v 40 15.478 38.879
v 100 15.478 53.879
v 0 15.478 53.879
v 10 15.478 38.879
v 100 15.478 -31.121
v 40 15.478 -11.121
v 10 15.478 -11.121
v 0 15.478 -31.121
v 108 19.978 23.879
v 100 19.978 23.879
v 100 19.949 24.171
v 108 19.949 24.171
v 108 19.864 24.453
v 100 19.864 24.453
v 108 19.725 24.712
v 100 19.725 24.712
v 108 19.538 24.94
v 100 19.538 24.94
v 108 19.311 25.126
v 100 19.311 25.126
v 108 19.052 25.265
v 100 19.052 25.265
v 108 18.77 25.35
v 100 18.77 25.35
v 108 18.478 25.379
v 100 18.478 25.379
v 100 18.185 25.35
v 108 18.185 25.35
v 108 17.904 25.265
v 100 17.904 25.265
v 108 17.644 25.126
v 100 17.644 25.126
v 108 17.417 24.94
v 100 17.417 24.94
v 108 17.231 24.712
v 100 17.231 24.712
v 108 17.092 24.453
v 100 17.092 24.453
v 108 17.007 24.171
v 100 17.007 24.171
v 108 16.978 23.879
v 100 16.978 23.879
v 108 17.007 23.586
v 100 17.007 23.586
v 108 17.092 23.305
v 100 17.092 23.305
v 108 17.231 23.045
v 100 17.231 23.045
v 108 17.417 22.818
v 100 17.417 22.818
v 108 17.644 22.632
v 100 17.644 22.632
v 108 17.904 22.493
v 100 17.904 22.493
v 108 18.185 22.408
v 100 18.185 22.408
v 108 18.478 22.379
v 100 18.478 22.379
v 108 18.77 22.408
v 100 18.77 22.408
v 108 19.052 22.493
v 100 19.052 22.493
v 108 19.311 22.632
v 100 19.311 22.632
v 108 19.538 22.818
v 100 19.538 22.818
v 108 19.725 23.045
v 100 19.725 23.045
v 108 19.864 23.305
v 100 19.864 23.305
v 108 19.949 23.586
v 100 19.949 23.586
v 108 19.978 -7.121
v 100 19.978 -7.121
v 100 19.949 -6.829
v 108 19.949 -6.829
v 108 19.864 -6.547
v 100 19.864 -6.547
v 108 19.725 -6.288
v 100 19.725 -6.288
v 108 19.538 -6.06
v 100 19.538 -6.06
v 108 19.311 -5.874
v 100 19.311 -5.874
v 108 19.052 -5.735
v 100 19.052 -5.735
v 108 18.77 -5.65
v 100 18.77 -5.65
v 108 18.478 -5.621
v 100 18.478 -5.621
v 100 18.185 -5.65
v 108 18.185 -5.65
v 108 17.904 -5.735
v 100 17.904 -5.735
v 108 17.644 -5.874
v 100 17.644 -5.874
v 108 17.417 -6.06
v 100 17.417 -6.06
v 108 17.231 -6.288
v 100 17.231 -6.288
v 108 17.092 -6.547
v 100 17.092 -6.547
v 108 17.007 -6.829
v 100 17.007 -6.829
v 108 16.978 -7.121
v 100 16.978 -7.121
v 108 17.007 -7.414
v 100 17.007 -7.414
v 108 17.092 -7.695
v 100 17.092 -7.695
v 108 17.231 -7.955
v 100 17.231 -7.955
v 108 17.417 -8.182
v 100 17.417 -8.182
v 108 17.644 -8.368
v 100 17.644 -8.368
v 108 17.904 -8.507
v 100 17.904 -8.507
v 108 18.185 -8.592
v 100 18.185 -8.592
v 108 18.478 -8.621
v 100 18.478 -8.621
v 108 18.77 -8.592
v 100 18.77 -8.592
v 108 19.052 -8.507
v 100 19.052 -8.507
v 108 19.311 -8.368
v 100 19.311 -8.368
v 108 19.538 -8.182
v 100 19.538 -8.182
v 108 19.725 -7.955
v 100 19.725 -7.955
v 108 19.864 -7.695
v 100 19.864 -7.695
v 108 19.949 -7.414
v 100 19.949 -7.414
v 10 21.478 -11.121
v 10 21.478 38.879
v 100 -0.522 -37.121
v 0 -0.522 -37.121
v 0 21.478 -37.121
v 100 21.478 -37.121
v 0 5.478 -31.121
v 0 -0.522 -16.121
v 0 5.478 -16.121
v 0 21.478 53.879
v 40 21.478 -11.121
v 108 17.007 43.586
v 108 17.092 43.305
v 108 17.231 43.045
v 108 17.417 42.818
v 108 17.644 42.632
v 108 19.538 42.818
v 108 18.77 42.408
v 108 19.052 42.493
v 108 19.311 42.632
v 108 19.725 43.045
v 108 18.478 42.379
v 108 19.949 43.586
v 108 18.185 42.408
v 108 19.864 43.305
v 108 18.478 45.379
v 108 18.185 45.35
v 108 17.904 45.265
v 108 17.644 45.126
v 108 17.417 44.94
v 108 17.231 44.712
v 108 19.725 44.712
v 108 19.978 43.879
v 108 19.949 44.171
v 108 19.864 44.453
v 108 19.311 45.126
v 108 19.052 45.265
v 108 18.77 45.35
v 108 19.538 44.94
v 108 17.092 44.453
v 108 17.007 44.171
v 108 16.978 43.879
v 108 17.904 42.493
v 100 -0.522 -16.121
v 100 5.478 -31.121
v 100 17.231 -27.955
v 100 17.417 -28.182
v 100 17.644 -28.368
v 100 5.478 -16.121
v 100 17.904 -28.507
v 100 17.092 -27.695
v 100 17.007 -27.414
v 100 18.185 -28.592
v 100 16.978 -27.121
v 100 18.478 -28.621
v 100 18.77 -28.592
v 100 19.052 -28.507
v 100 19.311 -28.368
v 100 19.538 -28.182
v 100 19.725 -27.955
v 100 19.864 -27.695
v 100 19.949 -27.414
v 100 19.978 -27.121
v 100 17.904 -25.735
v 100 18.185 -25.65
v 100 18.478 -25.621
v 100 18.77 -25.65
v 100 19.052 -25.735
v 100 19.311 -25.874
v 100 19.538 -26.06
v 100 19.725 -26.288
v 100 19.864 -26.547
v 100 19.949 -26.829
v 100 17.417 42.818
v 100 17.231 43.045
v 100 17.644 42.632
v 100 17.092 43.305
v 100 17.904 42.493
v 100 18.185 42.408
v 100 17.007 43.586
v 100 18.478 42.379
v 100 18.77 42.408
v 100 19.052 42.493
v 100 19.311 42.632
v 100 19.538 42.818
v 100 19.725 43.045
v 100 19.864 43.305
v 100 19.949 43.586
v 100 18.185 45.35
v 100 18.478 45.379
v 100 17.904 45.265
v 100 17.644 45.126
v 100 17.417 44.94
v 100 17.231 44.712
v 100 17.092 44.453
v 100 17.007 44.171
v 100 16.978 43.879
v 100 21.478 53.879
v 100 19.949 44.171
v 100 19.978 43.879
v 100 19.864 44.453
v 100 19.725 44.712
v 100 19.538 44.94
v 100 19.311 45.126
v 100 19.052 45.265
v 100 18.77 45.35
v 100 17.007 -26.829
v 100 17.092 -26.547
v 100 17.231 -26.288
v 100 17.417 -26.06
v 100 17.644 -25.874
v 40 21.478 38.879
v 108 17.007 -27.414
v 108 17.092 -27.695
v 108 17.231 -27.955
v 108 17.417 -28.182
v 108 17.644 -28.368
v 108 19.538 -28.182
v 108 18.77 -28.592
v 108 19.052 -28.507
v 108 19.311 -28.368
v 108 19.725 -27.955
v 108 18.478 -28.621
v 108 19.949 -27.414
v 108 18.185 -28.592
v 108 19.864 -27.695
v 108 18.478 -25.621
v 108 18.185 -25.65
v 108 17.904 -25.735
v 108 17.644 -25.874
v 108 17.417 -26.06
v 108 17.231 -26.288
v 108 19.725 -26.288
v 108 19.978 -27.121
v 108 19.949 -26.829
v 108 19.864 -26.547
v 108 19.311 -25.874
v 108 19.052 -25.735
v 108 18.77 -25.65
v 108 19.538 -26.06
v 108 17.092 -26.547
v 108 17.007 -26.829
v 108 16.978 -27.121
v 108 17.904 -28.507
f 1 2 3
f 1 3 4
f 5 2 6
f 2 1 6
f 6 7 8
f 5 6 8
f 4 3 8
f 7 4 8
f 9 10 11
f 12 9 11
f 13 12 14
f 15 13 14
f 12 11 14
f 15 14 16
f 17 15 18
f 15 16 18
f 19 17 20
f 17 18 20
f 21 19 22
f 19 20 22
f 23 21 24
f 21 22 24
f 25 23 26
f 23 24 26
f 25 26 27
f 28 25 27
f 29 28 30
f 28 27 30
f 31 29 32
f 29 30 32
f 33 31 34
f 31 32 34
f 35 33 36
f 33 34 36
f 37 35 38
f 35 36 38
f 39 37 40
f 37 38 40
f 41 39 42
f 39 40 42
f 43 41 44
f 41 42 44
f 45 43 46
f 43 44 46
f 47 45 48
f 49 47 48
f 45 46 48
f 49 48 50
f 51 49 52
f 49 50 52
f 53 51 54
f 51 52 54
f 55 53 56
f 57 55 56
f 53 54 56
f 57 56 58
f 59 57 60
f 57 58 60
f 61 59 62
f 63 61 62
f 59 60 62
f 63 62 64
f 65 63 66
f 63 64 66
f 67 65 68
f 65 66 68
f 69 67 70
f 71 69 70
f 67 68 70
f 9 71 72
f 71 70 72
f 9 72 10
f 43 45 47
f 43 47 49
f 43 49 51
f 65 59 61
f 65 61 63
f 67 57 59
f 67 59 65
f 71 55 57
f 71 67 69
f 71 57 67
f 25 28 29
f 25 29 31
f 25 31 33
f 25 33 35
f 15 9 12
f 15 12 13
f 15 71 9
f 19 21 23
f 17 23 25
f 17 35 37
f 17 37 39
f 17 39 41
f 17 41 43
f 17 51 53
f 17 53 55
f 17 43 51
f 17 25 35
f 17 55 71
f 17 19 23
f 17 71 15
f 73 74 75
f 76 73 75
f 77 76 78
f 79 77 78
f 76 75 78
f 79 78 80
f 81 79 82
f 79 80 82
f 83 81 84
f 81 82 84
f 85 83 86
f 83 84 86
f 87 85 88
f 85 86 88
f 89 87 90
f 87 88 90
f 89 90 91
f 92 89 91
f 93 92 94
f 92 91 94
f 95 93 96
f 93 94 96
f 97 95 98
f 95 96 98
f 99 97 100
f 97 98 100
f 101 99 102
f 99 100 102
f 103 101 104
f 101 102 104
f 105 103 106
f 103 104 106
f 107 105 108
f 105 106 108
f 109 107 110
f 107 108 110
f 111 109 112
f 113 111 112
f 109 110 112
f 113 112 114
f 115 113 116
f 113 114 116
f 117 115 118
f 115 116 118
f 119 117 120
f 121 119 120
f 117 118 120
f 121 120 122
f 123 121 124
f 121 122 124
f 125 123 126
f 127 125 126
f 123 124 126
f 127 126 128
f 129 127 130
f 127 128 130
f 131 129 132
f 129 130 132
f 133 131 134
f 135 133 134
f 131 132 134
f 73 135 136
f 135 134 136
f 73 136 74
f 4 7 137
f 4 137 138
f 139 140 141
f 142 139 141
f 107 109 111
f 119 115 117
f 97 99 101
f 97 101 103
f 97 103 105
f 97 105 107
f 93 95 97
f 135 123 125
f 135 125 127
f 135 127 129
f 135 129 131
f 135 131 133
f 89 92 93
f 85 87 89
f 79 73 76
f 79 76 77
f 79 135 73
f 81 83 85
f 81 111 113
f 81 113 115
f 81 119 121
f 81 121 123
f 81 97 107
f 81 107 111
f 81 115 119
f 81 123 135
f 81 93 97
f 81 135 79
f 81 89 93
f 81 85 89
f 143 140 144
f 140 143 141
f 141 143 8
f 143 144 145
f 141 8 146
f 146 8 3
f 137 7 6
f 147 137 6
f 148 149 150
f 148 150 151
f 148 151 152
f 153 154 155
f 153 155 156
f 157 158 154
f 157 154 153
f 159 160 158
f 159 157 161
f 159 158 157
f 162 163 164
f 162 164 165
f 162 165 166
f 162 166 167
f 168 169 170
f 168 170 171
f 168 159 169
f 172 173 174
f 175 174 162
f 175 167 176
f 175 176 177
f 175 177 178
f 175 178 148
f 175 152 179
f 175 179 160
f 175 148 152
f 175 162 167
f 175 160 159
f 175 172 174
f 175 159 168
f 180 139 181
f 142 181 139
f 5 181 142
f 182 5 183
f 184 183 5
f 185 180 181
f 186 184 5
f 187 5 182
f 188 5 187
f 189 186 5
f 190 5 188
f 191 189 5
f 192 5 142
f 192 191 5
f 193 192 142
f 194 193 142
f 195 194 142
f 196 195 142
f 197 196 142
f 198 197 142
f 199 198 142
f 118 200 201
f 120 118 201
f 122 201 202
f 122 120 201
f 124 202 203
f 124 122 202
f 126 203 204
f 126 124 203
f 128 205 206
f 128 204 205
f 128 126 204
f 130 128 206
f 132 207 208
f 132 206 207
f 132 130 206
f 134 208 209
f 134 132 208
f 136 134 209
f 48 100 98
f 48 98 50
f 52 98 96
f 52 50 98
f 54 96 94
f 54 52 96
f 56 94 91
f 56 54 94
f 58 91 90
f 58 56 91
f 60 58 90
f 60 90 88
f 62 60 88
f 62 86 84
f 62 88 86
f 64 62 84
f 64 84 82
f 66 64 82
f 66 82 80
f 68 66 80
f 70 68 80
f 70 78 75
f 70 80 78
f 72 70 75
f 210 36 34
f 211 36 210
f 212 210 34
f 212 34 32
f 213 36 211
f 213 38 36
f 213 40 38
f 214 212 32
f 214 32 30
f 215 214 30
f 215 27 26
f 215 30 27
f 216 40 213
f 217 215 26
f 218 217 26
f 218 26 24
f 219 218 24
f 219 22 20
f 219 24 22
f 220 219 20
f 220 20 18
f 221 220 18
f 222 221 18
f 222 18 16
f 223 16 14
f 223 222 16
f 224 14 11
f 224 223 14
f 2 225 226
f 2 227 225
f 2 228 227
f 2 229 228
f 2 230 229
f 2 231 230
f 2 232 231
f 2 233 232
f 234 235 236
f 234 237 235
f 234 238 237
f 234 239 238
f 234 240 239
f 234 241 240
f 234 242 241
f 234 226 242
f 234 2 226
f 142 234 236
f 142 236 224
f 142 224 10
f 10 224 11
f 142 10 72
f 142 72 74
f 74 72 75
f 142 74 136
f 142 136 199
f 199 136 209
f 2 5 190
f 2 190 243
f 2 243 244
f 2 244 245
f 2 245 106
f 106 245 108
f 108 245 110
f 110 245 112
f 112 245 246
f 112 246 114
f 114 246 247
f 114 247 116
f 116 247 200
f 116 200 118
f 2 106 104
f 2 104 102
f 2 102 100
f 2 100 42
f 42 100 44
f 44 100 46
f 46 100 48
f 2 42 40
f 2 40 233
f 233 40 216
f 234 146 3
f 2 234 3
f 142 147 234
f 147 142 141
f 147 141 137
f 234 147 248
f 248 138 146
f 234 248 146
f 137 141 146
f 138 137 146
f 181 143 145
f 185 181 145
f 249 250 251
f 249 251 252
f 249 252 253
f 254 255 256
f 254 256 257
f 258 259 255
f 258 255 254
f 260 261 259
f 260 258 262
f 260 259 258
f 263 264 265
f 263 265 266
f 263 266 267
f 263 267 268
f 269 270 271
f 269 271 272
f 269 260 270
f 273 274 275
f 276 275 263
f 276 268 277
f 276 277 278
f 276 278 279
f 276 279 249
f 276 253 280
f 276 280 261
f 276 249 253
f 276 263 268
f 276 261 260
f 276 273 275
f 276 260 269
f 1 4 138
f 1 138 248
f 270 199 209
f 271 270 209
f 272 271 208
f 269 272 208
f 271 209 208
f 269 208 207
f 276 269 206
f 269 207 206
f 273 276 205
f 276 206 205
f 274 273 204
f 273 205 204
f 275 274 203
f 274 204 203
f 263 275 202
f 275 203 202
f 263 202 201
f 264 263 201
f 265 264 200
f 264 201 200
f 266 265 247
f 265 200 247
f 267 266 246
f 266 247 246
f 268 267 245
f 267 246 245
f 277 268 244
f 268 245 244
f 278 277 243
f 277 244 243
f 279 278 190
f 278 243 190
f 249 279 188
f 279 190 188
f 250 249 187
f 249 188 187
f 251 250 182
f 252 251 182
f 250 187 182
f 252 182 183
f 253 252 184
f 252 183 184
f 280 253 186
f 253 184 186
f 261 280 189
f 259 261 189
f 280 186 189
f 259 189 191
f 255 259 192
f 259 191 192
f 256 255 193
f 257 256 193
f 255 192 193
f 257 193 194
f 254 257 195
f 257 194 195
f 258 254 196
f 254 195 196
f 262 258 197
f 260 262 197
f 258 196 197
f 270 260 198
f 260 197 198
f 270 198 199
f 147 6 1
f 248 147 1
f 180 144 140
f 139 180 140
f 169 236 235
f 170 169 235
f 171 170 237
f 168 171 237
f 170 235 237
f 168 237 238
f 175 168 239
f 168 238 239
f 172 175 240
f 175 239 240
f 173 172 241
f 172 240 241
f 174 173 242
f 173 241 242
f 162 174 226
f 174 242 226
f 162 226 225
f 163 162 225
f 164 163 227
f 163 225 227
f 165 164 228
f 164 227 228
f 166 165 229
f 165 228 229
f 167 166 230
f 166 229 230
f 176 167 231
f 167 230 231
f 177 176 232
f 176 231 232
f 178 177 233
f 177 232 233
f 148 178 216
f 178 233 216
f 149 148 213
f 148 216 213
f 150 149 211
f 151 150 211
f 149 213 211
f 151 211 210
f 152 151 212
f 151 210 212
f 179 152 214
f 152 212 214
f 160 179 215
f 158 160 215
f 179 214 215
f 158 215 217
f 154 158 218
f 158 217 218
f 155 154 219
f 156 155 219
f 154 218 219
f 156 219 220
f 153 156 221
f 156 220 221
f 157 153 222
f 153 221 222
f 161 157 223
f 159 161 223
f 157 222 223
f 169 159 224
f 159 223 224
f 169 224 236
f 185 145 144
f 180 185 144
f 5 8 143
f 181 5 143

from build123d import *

# Parameters (mm, degrees)
F1_DEPTH = 100
F2_W     = 30
F2_H     = 50
F3_DEPTH = 6
F4_R     = 1.5
F5_DEPTH = 8


with BuildPart() as f1:
    # F0 (on Right) → F1 (new body)
    with BuildSketch(Plane.YZ):
        Polygon((21.477706, -37.121146), (21.477706, 53.878854), (15.477706, 53.878854), (15.477706, -31.121146), (5.477706, -31.121146), (5.477706, -16.121146), (-0.522294, -16.121146), (-0.522294, -37.121146), align=None)
    extrude(amount=F1_DEPTH)

    # F2 (on face) → F3 (cut)
    with BuildSketch(Plane.XZ.offset(-15.477706)):
        with Locations((25, 13.878854)):
            Rectangle(F2_W, F2_H)
    extrude(amount=-F3_DEPTH, mode=Mode.SUBTRACT)

    # F4 (on face) → F5 (join)
    with BuildSketch(Plane.YZ.offset(100)):
        with Locations((18.477706, 43.878854)):
            Circle(F4_R)
        with Locations((18.477706, 23.878854)):
            Circle(F4_R)
        with Locations((18.477706, -7.121146)):
            Circle(F4_R)
        with Locations((18.477706, -27.121146)):
            Circle(F4_R)
    extrude(amount=F5_DEPTH)


solid = f1.part
